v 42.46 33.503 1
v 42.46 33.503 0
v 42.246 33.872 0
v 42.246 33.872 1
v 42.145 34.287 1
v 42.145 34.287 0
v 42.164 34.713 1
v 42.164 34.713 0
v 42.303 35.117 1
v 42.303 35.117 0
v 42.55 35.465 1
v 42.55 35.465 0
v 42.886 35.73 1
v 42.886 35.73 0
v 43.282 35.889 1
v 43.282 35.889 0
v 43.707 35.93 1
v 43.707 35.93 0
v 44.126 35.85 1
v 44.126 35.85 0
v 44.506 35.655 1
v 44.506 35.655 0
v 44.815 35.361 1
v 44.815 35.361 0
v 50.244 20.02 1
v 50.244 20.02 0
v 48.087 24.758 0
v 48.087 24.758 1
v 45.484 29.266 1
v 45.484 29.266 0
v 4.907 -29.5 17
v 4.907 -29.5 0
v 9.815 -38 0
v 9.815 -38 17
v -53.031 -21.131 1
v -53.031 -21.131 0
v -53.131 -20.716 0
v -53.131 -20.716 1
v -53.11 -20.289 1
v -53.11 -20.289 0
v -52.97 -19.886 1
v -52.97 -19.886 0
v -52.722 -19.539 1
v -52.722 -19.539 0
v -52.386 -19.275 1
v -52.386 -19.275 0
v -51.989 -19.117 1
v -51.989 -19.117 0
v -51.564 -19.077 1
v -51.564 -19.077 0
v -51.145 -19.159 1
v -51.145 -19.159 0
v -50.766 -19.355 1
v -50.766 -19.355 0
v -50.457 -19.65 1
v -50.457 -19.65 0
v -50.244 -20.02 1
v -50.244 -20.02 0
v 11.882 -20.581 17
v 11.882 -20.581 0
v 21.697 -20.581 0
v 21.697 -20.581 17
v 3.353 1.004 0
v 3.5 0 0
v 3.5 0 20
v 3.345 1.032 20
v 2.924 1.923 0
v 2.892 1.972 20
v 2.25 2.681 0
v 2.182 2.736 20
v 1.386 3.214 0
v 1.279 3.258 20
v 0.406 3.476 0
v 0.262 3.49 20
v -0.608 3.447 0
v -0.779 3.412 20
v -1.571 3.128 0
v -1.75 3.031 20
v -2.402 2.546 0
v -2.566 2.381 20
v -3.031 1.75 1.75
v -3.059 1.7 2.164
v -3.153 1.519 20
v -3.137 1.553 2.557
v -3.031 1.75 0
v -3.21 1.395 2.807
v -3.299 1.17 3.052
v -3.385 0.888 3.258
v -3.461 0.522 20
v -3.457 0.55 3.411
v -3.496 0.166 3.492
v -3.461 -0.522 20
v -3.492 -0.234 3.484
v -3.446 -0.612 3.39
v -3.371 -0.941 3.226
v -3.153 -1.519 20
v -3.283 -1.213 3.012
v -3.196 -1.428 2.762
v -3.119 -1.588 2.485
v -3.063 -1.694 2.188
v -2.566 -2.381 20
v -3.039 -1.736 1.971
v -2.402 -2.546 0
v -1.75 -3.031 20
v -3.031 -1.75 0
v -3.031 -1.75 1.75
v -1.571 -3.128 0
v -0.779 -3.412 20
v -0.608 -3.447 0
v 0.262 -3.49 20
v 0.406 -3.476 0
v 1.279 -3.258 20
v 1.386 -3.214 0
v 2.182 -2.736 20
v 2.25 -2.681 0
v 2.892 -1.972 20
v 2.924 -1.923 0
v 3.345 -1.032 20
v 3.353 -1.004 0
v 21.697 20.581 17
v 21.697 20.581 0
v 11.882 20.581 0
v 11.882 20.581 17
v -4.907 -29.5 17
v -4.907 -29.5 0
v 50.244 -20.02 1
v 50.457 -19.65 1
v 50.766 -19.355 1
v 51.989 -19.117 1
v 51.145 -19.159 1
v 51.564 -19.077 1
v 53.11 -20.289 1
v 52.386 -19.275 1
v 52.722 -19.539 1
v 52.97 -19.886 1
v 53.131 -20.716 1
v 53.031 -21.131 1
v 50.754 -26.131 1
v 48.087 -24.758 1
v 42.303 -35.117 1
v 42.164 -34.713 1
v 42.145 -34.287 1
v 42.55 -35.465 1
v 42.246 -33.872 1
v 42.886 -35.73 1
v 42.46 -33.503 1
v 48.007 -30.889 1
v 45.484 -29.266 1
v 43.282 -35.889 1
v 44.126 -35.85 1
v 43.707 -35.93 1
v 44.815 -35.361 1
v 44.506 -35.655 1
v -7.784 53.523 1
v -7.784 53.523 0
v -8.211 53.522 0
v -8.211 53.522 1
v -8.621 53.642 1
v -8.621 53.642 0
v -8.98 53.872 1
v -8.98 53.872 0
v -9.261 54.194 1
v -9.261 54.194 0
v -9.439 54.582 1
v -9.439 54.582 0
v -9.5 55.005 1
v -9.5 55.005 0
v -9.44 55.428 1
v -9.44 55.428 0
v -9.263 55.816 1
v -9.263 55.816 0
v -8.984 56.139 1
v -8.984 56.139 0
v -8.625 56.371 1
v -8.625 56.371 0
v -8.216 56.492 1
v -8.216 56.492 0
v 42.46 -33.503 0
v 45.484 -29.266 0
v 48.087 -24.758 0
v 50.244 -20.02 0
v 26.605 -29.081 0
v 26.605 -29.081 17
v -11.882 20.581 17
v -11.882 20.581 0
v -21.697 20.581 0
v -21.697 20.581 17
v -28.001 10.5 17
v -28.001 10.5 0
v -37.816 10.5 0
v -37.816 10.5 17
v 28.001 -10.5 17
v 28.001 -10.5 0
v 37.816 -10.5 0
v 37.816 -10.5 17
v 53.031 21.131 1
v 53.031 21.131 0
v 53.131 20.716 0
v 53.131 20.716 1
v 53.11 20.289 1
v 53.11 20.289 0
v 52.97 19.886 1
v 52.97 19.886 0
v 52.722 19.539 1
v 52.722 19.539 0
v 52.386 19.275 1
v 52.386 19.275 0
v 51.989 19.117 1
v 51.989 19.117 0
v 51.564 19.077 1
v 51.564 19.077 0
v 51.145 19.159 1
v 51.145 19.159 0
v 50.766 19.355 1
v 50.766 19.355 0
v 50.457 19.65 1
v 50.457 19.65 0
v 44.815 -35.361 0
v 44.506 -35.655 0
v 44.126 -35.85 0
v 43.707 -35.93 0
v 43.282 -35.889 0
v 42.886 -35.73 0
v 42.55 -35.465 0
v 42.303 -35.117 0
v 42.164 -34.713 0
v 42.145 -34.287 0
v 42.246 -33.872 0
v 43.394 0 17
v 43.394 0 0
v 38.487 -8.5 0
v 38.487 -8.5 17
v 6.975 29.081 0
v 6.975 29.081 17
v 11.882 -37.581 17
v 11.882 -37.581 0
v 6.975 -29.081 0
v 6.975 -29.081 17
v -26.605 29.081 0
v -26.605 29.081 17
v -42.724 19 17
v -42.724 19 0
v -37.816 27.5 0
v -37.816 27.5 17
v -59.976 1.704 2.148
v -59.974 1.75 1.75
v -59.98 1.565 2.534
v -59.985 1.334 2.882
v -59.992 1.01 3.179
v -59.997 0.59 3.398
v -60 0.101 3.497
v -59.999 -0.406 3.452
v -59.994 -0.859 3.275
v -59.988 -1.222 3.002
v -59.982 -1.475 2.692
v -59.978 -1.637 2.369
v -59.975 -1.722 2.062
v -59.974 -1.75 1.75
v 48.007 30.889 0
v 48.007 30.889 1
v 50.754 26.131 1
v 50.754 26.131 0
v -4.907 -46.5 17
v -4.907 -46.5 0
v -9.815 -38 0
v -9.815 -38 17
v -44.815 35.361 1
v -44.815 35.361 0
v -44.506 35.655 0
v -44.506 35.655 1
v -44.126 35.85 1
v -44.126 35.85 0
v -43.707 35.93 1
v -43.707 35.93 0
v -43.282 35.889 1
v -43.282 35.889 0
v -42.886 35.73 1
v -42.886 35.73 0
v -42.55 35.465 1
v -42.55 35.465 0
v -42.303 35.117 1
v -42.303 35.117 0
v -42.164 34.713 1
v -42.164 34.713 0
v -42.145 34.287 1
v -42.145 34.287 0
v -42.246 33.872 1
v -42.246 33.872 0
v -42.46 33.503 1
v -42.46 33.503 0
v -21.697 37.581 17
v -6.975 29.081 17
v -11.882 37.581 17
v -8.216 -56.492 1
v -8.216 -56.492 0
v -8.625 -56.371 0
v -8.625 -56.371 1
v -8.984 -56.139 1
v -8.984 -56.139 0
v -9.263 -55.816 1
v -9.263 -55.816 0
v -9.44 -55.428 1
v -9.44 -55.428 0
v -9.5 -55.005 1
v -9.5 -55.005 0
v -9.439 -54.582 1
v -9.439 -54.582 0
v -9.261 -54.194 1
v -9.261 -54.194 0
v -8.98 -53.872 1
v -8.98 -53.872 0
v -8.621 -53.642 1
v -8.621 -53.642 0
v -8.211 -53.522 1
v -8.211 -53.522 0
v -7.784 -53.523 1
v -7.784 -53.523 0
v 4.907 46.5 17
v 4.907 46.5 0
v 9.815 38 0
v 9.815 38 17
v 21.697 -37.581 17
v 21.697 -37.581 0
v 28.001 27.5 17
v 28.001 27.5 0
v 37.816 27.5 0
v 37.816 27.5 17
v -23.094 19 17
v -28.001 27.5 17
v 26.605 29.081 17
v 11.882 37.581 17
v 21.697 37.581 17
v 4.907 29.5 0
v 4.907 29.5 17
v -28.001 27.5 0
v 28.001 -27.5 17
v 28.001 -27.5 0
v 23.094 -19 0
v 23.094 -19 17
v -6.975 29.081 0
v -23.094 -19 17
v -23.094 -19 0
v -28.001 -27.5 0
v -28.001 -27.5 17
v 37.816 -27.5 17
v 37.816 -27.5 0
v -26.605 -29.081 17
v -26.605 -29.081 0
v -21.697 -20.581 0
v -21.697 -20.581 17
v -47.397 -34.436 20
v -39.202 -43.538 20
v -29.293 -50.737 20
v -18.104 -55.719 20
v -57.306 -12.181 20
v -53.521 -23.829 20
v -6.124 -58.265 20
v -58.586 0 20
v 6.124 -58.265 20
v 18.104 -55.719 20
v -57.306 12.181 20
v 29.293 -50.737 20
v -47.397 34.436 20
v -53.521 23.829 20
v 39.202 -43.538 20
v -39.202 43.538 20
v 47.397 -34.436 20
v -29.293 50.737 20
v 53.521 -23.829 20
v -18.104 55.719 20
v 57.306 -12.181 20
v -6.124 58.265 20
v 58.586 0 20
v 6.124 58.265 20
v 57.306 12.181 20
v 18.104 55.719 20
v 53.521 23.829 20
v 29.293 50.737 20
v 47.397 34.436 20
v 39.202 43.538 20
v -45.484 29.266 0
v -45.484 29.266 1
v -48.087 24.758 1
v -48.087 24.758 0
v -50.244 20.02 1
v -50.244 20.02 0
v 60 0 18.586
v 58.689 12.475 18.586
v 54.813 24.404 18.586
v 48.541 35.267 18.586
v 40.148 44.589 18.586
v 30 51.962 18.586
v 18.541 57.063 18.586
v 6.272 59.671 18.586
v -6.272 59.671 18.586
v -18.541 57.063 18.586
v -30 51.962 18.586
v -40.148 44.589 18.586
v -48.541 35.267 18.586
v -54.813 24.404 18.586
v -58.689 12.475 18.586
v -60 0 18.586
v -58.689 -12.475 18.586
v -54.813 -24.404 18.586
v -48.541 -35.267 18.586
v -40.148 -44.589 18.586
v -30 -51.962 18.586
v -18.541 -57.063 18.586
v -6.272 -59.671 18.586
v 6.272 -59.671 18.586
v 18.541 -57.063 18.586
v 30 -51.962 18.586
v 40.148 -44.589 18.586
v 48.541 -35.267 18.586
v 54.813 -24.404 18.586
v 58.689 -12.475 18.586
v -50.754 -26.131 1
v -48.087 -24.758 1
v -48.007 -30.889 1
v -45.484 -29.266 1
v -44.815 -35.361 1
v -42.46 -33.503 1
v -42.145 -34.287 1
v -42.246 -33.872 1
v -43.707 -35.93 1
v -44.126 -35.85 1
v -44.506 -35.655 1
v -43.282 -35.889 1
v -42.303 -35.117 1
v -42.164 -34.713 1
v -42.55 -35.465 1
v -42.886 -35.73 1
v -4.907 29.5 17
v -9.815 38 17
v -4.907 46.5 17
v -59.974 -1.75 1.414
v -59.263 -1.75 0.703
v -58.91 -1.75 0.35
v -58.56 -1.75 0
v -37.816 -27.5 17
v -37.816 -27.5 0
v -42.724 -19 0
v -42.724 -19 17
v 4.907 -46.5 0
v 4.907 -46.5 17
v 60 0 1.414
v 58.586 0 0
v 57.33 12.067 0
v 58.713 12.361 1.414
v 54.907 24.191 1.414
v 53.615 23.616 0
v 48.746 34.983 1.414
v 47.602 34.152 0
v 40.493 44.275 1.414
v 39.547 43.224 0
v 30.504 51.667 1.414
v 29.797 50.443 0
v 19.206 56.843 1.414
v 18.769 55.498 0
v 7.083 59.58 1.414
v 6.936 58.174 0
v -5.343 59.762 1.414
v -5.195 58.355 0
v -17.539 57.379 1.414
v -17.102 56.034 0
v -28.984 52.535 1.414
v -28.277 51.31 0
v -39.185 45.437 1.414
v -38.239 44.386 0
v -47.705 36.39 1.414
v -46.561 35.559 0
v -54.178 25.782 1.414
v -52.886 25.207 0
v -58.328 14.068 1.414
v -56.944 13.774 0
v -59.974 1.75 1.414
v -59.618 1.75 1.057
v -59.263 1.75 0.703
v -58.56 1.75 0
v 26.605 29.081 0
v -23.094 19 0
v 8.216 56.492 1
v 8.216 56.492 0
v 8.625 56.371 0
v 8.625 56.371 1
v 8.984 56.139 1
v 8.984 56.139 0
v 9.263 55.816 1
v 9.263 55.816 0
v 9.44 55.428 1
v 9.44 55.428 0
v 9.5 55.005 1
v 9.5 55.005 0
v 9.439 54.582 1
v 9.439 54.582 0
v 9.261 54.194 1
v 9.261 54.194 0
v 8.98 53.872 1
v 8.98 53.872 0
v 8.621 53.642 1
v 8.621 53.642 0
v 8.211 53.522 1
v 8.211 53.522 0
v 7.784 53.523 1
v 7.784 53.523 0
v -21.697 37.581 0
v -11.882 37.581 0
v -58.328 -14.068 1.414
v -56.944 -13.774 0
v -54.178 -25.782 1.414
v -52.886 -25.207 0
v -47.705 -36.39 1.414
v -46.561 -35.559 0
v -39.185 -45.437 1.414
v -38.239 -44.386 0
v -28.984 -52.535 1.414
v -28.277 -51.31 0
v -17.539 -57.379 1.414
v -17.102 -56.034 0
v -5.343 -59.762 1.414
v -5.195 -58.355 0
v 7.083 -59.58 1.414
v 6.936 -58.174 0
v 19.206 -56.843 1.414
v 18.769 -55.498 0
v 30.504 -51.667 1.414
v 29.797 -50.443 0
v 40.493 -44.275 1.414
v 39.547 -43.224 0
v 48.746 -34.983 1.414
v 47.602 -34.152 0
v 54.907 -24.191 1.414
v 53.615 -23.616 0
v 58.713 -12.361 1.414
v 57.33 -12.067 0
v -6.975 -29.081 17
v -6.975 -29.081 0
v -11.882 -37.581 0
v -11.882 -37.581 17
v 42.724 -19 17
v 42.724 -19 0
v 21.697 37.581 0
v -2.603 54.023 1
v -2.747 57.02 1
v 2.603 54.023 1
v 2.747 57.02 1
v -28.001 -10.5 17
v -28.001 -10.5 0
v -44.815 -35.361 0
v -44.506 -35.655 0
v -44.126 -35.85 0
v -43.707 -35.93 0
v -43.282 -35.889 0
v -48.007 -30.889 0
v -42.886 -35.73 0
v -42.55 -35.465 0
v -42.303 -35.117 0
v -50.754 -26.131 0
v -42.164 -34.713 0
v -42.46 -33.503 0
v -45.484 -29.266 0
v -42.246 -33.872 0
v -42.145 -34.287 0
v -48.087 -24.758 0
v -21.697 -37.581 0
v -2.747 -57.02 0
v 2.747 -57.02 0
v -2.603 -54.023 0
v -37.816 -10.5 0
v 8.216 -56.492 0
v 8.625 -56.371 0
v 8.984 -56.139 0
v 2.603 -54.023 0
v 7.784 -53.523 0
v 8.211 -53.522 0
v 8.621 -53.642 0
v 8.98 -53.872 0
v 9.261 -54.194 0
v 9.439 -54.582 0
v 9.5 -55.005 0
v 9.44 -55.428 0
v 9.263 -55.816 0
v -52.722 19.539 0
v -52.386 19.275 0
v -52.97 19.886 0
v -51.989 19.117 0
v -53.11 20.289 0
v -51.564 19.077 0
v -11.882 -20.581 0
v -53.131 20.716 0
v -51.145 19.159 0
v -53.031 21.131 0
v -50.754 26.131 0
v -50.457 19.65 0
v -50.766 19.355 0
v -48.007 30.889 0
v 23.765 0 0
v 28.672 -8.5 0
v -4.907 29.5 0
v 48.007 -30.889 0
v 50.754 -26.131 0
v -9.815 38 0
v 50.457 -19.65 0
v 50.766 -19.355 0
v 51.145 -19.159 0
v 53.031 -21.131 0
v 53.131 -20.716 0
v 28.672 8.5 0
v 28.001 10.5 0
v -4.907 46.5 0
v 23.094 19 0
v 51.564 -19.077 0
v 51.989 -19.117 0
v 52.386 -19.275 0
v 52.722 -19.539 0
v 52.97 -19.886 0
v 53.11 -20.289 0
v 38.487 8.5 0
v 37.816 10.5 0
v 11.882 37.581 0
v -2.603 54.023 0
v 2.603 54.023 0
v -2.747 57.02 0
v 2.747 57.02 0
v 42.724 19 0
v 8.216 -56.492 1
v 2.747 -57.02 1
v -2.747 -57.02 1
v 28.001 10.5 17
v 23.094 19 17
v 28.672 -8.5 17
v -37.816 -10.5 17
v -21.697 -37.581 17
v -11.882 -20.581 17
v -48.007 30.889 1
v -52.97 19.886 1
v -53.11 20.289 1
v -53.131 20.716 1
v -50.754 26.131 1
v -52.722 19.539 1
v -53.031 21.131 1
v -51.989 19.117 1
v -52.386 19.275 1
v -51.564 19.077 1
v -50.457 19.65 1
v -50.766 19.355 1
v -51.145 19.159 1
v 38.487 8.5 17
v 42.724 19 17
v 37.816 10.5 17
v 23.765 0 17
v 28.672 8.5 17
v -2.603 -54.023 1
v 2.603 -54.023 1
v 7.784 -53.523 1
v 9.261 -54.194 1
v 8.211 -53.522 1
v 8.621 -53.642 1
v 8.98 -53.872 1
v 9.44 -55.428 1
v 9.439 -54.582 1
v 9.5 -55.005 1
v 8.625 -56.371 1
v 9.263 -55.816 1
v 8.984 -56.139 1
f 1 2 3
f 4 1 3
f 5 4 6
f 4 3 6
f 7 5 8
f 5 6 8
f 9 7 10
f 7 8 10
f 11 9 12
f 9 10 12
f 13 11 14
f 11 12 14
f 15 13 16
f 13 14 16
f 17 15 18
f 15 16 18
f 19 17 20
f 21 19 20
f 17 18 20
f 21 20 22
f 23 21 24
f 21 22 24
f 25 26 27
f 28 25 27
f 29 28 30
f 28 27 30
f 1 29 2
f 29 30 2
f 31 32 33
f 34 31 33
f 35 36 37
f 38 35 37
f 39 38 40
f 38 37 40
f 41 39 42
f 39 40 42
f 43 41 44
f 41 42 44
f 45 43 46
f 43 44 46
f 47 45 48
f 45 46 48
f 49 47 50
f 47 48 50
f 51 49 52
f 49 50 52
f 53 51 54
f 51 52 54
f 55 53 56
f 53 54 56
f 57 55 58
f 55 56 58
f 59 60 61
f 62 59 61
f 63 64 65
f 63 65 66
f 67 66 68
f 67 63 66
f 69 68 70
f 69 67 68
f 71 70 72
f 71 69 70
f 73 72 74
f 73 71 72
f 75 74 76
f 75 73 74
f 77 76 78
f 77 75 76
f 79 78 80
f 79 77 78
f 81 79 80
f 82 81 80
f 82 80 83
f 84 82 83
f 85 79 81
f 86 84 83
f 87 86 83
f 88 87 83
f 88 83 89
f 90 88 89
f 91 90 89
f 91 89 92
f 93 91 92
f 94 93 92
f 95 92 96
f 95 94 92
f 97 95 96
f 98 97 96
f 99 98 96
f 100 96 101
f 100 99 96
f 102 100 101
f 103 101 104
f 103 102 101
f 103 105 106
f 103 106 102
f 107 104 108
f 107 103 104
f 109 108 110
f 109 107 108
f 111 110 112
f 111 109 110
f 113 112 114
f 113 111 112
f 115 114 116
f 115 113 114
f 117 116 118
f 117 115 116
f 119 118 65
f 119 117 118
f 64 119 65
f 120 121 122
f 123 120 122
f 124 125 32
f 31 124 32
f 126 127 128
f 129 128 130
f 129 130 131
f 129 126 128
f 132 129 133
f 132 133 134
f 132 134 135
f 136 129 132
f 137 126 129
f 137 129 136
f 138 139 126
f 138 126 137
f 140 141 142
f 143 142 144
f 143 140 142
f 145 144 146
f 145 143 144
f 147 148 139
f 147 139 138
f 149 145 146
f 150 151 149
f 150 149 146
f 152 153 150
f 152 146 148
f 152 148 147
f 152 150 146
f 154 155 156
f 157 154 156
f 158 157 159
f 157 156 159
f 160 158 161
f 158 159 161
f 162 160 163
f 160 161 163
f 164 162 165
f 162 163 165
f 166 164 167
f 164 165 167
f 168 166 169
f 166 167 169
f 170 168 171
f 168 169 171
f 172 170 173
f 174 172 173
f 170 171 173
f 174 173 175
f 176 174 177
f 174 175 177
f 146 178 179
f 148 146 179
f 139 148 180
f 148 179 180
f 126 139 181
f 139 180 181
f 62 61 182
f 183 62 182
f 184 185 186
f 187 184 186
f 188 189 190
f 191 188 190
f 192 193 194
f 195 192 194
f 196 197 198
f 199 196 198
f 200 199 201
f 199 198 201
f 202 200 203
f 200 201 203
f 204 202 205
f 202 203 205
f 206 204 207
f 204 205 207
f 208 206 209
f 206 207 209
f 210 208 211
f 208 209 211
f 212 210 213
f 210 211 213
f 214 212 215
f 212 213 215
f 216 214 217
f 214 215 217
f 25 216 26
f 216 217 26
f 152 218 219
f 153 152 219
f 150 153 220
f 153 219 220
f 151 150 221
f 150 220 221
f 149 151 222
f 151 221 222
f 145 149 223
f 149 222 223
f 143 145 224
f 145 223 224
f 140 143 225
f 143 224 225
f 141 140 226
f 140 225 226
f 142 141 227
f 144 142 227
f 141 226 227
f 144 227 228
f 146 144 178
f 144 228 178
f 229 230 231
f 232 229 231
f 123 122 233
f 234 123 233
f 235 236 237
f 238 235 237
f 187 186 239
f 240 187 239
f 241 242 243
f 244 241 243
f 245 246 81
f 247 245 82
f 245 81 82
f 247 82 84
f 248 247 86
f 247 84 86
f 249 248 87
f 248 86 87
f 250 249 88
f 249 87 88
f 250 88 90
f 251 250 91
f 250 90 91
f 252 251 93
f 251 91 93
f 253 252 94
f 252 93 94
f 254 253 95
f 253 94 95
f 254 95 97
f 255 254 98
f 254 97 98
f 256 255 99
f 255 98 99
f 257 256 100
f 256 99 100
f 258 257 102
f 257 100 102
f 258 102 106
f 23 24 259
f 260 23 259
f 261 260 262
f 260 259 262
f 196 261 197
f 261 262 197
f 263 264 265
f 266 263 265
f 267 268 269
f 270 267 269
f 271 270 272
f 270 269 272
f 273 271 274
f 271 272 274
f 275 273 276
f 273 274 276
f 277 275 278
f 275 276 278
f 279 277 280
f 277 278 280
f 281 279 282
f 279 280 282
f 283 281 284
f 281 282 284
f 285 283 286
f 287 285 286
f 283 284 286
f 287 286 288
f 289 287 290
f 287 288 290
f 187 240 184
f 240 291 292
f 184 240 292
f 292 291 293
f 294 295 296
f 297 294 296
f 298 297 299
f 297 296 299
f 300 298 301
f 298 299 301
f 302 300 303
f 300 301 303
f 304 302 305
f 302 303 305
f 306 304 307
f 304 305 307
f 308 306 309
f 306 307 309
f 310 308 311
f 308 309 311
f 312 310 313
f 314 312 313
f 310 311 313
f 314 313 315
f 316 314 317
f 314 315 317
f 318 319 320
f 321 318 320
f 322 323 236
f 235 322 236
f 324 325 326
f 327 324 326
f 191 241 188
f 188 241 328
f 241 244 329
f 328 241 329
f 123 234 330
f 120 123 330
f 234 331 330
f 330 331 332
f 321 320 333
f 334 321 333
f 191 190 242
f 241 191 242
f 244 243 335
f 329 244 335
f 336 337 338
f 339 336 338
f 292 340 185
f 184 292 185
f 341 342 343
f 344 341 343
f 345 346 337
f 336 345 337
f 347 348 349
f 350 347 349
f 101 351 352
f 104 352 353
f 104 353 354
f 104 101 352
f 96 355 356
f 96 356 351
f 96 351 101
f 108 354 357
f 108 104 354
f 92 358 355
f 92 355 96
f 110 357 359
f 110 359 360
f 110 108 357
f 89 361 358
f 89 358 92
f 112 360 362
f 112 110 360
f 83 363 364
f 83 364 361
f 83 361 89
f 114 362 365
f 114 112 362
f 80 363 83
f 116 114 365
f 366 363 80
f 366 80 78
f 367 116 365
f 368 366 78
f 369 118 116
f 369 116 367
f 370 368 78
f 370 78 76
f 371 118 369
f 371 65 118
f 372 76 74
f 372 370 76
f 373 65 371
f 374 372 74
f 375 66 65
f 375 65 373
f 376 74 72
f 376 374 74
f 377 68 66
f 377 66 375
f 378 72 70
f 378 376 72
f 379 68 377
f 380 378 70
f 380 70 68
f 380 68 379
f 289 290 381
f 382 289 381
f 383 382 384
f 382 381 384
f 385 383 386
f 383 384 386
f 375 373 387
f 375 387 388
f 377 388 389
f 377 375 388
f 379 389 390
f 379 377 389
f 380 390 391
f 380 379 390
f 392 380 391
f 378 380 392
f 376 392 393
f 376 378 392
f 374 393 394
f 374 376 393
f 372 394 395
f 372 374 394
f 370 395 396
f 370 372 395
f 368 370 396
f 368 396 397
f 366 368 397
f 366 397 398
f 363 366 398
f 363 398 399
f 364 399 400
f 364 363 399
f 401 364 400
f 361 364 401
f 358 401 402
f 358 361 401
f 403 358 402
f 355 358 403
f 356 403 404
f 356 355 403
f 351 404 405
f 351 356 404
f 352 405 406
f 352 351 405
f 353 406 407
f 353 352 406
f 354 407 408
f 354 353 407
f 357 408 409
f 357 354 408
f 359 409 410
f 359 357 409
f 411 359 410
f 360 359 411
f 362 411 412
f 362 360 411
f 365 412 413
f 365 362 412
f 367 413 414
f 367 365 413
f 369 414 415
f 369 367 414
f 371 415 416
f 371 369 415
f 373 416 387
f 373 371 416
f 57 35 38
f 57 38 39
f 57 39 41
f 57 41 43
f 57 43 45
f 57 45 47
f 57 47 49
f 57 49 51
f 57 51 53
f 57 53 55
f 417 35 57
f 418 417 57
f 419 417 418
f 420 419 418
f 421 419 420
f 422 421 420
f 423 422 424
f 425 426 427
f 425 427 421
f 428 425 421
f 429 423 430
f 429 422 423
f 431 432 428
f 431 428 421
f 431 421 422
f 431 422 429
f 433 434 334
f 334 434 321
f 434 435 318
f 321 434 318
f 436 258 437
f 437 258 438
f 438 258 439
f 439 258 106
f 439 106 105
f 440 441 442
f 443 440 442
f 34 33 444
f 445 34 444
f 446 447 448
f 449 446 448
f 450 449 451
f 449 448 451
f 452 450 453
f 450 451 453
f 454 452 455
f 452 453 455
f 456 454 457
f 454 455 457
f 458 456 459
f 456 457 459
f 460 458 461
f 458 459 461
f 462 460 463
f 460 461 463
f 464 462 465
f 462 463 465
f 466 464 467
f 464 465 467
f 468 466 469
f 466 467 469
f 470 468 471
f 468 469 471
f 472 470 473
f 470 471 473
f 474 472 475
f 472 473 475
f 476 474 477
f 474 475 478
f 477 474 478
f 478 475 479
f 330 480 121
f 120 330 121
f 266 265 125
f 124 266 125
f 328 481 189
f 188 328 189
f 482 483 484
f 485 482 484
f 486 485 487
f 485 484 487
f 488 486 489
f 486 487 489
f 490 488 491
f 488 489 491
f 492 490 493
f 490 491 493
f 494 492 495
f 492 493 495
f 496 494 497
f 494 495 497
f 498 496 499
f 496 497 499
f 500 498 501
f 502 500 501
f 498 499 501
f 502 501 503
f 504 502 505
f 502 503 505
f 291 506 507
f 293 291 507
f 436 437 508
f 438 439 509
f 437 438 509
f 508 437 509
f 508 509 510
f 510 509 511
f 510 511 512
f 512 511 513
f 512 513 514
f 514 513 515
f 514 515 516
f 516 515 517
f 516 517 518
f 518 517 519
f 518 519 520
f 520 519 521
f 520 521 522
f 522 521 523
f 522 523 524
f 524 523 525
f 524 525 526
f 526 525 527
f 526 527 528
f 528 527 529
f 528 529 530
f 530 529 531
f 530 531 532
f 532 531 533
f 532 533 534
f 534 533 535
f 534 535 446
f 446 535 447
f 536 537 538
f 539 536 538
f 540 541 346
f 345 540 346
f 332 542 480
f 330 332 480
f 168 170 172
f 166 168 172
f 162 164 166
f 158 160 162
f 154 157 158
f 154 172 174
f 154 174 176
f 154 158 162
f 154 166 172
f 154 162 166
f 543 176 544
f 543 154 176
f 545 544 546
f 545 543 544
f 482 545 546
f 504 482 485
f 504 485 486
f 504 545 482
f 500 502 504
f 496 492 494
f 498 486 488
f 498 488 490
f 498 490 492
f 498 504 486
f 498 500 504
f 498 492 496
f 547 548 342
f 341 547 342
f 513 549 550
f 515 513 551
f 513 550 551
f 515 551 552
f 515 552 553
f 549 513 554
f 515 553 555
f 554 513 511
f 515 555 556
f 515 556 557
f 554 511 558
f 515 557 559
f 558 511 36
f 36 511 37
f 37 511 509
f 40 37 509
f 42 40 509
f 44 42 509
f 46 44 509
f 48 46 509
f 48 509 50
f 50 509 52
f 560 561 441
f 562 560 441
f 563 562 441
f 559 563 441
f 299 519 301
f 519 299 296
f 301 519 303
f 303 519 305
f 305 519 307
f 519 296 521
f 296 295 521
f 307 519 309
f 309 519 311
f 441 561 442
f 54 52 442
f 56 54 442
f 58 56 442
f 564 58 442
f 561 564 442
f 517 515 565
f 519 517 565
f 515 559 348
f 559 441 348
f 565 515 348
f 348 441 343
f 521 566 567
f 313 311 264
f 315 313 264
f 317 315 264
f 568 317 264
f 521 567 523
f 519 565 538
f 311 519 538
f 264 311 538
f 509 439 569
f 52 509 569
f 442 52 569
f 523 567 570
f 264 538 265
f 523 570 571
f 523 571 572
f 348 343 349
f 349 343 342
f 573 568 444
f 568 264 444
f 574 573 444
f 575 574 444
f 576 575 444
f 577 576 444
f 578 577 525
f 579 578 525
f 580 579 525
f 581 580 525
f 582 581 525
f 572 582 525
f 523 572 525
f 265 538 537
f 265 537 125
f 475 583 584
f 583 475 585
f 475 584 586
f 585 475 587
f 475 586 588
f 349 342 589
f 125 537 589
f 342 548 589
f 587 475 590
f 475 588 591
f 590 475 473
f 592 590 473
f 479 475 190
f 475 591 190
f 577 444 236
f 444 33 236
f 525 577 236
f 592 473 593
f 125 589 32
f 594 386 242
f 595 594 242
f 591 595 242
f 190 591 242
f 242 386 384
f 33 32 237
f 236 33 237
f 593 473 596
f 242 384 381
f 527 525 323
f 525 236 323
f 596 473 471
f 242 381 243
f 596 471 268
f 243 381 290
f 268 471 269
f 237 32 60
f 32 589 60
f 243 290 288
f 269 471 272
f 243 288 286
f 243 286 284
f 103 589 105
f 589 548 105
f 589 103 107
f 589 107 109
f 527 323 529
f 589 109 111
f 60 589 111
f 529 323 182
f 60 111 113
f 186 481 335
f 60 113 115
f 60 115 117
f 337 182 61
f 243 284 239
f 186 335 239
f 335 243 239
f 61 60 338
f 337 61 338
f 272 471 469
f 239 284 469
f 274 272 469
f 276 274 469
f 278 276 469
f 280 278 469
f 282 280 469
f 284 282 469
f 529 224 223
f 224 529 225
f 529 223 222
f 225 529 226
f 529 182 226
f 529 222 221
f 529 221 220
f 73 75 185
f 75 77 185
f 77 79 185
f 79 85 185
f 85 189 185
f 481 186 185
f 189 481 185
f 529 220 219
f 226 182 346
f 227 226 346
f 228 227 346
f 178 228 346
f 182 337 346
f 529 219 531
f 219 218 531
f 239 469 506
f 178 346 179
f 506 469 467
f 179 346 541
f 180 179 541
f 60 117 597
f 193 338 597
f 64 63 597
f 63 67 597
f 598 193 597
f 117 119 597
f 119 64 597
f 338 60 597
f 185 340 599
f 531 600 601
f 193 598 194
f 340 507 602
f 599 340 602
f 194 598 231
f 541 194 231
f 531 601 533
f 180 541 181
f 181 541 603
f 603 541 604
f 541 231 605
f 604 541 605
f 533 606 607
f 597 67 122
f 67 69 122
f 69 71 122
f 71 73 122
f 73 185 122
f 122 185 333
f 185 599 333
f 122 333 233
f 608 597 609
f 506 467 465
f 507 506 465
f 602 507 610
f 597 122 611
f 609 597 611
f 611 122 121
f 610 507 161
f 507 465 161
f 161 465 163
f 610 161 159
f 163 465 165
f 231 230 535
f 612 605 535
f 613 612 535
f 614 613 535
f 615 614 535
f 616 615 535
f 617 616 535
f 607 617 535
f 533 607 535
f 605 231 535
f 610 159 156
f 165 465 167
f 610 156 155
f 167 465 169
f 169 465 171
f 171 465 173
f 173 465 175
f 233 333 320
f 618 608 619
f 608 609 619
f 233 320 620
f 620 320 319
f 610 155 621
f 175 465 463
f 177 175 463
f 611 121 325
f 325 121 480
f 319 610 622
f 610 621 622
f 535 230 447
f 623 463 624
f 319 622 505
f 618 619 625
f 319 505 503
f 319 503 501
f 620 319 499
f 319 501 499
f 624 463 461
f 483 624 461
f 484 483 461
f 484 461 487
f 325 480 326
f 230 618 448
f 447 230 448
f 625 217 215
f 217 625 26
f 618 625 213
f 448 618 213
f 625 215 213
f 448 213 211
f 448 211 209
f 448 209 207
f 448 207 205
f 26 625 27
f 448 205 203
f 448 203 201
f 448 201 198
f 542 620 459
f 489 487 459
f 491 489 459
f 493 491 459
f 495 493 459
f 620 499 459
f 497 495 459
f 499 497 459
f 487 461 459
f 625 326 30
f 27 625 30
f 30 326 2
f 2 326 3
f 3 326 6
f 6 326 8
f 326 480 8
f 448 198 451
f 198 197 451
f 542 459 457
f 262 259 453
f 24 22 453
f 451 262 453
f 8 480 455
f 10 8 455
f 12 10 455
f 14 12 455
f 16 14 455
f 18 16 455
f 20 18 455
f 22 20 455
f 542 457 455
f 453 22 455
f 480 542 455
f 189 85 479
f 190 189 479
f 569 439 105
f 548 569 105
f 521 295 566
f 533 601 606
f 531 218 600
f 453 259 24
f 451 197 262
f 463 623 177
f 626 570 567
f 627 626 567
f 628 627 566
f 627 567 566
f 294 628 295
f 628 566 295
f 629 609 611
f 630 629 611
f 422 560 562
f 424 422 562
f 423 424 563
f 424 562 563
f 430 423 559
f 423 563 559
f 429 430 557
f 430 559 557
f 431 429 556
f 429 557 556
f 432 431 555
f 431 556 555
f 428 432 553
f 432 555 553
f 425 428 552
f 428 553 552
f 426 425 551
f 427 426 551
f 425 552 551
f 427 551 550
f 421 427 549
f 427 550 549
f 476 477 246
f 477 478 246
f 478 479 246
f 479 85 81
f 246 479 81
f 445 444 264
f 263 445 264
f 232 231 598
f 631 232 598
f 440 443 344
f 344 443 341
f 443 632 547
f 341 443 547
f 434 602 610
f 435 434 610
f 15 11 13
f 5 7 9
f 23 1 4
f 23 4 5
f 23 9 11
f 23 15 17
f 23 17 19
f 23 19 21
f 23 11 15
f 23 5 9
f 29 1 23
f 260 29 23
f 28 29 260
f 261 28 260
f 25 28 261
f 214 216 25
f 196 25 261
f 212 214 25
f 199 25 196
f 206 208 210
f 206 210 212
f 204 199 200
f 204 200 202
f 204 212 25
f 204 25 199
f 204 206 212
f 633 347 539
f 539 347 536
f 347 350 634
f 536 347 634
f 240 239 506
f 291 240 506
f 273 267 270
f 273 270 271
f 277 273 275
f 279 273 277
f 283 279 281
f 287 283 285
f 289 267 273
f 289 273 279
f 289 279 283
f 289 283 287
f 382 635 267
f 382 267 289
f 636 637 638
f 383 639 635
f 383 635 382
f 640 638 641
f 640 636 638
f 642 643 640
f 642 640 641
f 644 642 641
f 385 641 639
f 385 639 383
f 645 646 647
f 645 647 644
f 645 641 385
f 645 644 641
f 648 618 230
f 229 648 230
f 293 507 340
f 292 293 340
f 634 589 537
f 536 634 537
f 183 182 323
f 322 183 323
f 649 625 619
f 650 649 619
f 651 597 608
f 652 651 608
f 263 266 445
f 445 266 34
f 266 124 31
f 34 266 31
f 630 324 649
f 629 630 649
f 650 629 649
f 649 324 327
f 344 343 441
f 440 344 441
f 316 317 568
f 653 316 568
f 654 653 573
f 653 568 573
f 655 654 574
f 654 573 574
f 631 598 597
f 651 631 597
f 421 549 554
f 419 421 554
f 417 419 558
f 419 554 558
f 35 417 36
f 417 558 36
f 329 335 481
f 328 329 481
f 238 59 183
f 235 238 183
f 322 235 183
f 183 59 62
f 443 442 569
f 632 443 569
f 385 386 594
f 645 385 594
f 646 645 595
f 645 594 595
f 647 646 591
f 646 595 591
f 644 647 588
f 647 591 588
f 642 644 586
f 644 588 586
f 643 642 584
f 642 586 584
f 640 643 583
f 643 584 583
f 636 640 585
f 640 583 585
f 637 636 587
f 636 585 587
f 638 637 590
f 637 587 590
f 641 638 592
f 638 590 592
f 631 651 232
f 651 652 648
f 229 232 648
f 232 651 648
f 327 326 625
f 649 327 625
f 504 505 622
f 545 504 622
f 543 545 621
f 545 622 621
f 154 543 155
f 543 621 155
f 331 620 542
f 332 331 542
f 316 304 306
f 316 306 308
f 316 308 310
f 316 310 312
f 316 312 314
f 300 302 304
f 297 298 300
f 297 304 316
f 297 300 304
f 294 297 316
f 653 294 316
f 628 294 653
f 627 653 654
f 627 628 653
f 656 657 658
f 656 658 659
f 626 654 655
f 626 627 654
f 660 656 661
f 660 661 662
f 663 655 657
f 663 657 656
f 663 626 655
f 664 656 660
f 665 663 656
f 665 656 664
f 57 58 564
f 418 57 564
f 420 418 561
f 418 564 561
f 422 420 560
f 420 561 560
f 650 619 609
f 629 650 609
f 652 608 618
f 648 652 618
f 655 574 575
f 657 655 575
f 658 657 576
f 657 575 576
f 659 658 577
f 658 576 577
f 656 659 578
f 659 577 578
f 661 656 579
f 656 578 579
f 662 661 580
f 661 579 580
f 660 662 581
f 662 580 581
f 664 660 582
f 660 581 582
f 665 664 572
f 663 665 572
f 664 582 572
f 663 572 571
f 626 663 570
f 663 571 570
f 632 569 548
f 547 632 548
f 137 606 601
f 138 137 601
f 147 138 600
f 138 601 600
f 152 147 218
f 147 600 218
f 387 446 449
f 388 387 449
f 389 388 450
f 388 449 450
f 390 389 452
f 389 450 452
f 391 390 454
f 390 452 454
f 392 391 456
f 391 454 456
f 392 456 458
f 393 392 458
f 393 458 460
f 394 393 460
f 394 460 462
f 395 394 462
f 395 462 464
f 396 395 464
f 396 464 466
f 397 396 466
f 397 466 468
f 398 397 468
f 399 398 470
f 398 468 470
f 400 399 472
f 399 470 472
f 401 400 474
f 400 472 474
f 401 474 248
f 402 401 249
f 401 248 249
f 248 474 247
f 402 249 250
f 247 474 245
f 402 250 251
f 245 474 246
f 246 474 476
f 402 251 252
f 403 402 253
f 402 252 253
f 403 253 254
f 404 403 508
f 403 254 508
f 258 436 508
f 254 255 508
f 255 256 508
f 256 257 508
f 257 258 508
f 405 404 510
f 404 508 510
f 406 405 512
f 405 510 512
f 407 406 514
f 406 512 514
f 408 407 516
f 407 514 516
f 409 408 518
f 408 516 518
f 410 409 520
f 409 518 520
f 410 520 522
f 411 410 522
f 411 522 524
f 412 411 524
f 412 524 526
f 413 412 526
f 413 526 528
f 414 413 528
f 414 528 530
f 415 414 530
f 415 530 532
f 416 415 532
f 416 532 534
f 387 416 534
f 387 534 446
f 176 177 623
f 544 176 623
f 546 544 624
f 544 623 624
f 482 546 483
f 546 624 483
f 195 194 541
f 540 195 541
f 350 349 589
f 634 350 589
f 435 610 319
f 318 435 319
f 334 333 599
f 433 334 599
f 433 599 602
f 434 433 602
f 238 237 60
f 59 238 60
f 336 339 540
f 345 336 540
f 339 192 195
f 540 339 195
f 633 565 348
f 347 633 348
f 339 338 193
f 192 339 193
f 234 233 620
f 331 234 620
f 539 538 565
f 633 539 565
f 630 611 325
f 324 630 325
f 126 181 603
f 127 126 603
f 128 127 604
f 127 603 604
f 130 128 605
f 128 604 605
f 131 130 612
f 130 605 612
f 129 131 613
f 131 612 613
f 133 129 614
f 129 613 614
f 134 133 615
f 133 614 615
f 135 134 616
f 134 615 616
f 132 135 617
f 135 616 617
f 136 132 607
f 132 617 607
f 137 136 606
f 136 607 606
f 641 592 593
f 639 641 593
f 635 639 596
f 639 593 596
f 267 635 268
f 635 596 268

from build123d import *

# Parameters (mm, degrees)
F0_R     = 60
F0_R_2   = 3.5
F1_DEPTH = 20
F2_START = 17
F2_DEPTH = 3
F3_SIZE  = 1.414
F4_SIZE  = 1.414
F6_DEPTH = 150
F8_DEPTH = 1


with BuildPart() as f1:
    # F0 (on Top) → F1 (new body)
    with BuildSketch(Plane.XY):
        Circle(F0_R)
        Polygon((-28.0014880557, -10.5), (-23.0940107676, -19), (-28.0014880557, -27.5), (-37.8164426319, -27.5), (-42.72391992, -19), (-37.8164426319, -10.5), align=None, mode=Mode.SUBTRACT)
        Polygon((-21.6972137465, -20.5806765917), (-11.8822591703, -20.5806765917), (-6.9747818822, -29.0806765917), (-11.8822591703, -37.5806765917), (-21.6972137465, -37.5806765917), (-26.6046910346, -29.0806765917), align=None, mode=Mode.SUBTRACT)
        Polygon((-4.9074772881, -29.5), (4.9074772881, -29.5), (9.8149545762, -38), (4.9074772881, -46.5), (-4.9074772881, -46.5), (-9.8149545762, -38), align=None, mode=Mode.SUBTRACT)
        Polygon((6.9747818822, -29.0806765917), (11.8822591703, -20.5806765917), (21.6972137465, -20.5806765917), (26.6046910346, -29.0806765917), (21.6972137465, -37.5806765917), (11.8822591703, -37.5806765917), align=None, mode=Mode.SUBTRACT)
        Polygon((23.0940107676, -19), (28.0014880557, -10.5), (37.8164426319, -10.5), (42.72391992, -19), (37.8164426319, -27.5), (28.0014880557, -27.5), align=None, mode=Mode.SUBTRACT)
        Polygon((-23.0940107676, 19), (-28.0014880557, 10.5), (-37.8164426319, 10.5), (-42.72391992, 19), (-37.8164426319, 27.5), (-28.0014880557, 27.5), align=None, mode=Mode.SUBTRACT)
        Polygon((-26.6046910346, 29.0806765917), (-21.6972137465, 37.5806765917), (-11.8822591703, 37.5806765917), (-6.9747818822, 29.0806765917), (-11.8822591703, 20.5806765917), (-21.6972137465, 20.5806765917), align=None, mode=Mode.SUBTRACT)
        Circle(F0_R_2, mode=Mode.SUBTRACT)
        Polygon((21.6972137465, 20.5806765917), (11.8822591703, 20.5806765917), (6.9747818822, 29.0806765917), (11.8822591703, 37.5806765917), (21.6972137465, 37.5806765917), (26.6046910346, 29.0806765917), align=None, mode=Mode.SUBTRACT)
        Polygon((28.6719956287, -8.5), (23.7645183406, 0), (28.6719956287, 8.5), (38.4869502049, 8.5), (43.3944274931, 0), (38.4869502049, -8.5), align=None, mode=Mode.SUBTRACT)
        Polygon((28.0014880557, 10.5), (23.0940107676, 19), (28.0014880557, 27.5), (37.8164426319, 27.5), (42.72391992, 19), (37.8164426319, 10.5), align=None, mode=Mode.SUBTRACT)
        Polygon((9.8149545762, 38), (4.9074772881, 29.5), (-4.9074772881, 29.5), (-9.8149545762, 38), (-4.9074772881, 46.5), (4.9074772881, 46.5), align=None, mode=Mode.SUBTRACT)
    extrude(amount=F1_DEPTH)

    # F0 (on Top) → F2 (join)
    with BuildSketch(Plane.XY.offset(F2_START)):
        Polygon((-37.8164426319, 10.5), (-28.0014880557, 10.5), (-23.0940107676, 19), (-28.0014880557, 27.5), (-37.8164426319, 27.5), (-42.72391992, 19), align=None)
        Polygon((-4.9074772881, 29.5), (4.9074772881, 29.5), (9.8149545762, 38), (4.9074772881, 46.5), (-4.9074772881, 46.5), (-9.8149545762, 38), align=None)
        Polygon((28.0014880557, 27.5), (23.0940107676, 19), (28.0014880557, 10.5), (37.8164426319, 10.5), (42.72391992, 19), (37.8164426319, 27.5), align=None)
        Polygon((37.8164426319, -10.5), (28.0014880557, -10.5), (23.0940107676, -19), (28.0014880557, -27.5), (37.8164426319, -27.5), (42.72391992, -19), align=None)
        Polygon((9.8149545762, -38), (4.9074772881, -29.5), (-4.9074772881, -29.5), (-9.8149545762, -38), (-4.9074772881, -46.5), (4.9074772881, -46.5), align=None)
        Polygon((-28.0014880557, -27.5), (-23.0940107676, -19), (-28.0014880557, -10.5), (-37.8164426319, -10.5), (-42.72391992, -19), (-37.8164426319, -27.5), align=None)
        Polygon((-6.9747818822, -29.0806765917), (-11.8822591703, -20.5806765917), (-21.6972137465, -20.5806765917), (-26.6046910346, -29.0806765917), (-21.6972137465, -37.5806765917), (-11.8822591703, -37.5806765917), align=None)
        Polygon((21.6972137465, -20.5806765917), (11.8822591703, -20.5806765917), (6.9747818822, -29.0806765917), (11.8822591703, -37.5806765917), (21.6972137465, -37.5806765917), (26.6046910346, -29.0806765917), align=None)
        Polygon((28.6719956287, 8.5), (23.7645183406, 0), (28.6719956287, -8.5), (38.4869502049, -8.5), (43.3944274931, 0), (38.4869502049, 8.5), align=None)
        Polygon((6.9747818822, 29.0806765917), (11.8822591703, 20.5806765917), (21.6972137465, 20.5806765917), (26.6046910346, 29.0806765917), (21.6972137465, 37.5806765917), (11.8822591703, 37.5806765917), align=None)
        Polygon((-11.8822591703, 37.5806765917), (-21.6972137465, 37.5806765917), (-26.6046910346, 29.0806765917), (-21.6972137465, 20.5806765917), (-11.8822591703, 20.5806765917), (-6.9747818822, 29.0806765917), align=None)
    extrude(amount=F2_DEPTH)

    # F3
    f3_edges = [f1.edges().sort_by_distance(p)[0] for p in [
        (-60, 0, 20),
    ]]
    chamfer(f3_edges, length=F3_SIZE)

    # F4
    f4_edges = [f1.edges().sort_by_distance(p)[0] for p in [
        (-60, 0, 0),
    ]]
    chamfer(f4_edges, length=F4_SIZE)

    # F5 (on Right) → F6 (cut)
    with BuildSketch(Plane.YZ):
        with BuildLine():
            Line((-1.75, 1.75), (1.75, 1.75))
            ThreePointArc((1.75, 1.75), (0, 3.5), (-1.75, 1.75))
        make_face()
        with BuildLine():
            Line((1.75, -1.75), (1.75, 1.75))
            ThreePointArc((1.75, 1.75), (0, 0), (-1.75, 1.75))
            Line((-1.75, 1.75), (-1.75, -1.75))
            Line((-1.75, -1.75), (1.75, -1.75))
        make_face()
        with BuildLine():
            ThreePointArc((-1.75, 1.75), (0, 0), (1.75, 1.75))
            Line((1.75, 1.75), (-1.75, 1.75))
        make_face()
    extrude(amount=-F6_DEPTH, mode=Mode.SUBTRACT)

    # F7 (on face) → F8 (cut)
    with BuildSketch(Plane(origin=(0, 0, 0), x_dir=(1, 0, 0), z_dir=(0, 0, -1))):
        with BuildLine():
            ThreePointArc((-44.8152950723, -35.3610056924), (-42.7085709868, -35.6094279688), (-42.4601487104, -33.5027038833))
            ThreePointArc((-42.4601487104, -33.5027038833), (-46.8398499891, -27.043), (-50.2442670136, -20.02021549))
            ThreePointArc((-50.2442670136, -20.02021549), (-52.1929547286, -19.1819934495), (-53.0311767692, -21.1306811645))
            ThreePointArc((-53.0311767692, -21.1306811645), (-49.4379262004, -28.543), (-44.8152950723, -35.3610056924))
        make_face()
        with BuildLine():
            ThreePointArc((-53.0311767692, 21.1306811645), (-52.1929547286, 19.1819934495), (-50.2442670136, 20.02021549))
            ThreePointArc((-50.2442670136, 20.02021549), (-46.8398499891, 27.043), (-42.4601487104, 33.5027038833))
            ThreePointArc((-42.4601487104, 33.5027038833), (-42.7085709868, 35.6094279688), (-44.8152950723, 35.3610056924))
            ThreePointArc((-44.8152950723, 35.3610056924), (-49.4379262004, 28.543), (-53.0311767692, 21.1306811645))
        make_face()
        with BuildLine():
            ThreePointArc((-8.2158816968, 56.4916868569), (-9.4843837418, 54.7914214183), (-7.7841183032, 53.5229193733))
            ThreePointArc((-7.7841183032, 53.5229193733), (0, 54.086), (7.7841183032, 53.5229193733))
            ThreePointArc((7.7841183032, 53.5229193733), (9.4843837418, 54.7914214183), (8.2158816968, 56.4916868569))
            ThreePointArc((8.2158816968, 56.4916868569), (0, 57.086), (-8.2158816968, 56.4916868569))
        make_face()
        with BuildLine():
            ThreePointArc((44.8152950723, 35.3610056924), (42.7085709868, 35.6094279688), (42.4601487104, 33.5027038833))
            ThreePointArc((42.4601487104, 33.5027038833), (46.8398499891, 27.043), (50.2442670136, 20.02021549))
            ThreePointArc((50.2442670136, 20.02021549), (52.1929547286, 19.1819934495), (53.0311767692, 21.1306811645))
            ThreePointArc((53.0311767692, 21.1306811645), (49.4379262004, 28.543), (44.8152950723, 35.3610056924))
        make_face()
        with BuildLine():
            ThreePointArc((53.0311767692, -21.1306811645), (52.1929547286, -19.1819934495), (50.2442670136, -20.02021549))
            ThreePointArc((50.2442670136, -20.02021549), (46.8398499891, -27.043), (42.4601487104, -33.5027038833))
            ThreePointArc((42.4601487104, -33.5027038833), (42.7085709868, -35.6094279688), (44.8152950723, -35.3610056924))
            ThreePointArc((44.8152950723, -35.3610056924), (49.4379262004, -28.543), (53.0311767692, -21.1306811645))
        make_face()
        with BuildLine():
            ThreePointArc((8.2158816968, -56.4916868569), (9.4843837418, -54.7914214183), (7.7841183032, -53.5229193733))
            ThreePointArc((7.7841183032, -53.5229193733), (0, -54.086), (-7.7841183032, -53.5229193733))
            ThreePointArc((-7.7841183032, -53.5229193733), (-9.4843837418, -54.7914214183), (-8.2158816968, -56.4916868569))
            ThreePointArc((-8.2158816968, -56.4916868569), (0, -57.086), (8.2158816968, -56.4916868569))
        make_face()
    extrude(amount=-F8_DEPTH, mode=Mode.SUBTRACT)


solid = f1.part
